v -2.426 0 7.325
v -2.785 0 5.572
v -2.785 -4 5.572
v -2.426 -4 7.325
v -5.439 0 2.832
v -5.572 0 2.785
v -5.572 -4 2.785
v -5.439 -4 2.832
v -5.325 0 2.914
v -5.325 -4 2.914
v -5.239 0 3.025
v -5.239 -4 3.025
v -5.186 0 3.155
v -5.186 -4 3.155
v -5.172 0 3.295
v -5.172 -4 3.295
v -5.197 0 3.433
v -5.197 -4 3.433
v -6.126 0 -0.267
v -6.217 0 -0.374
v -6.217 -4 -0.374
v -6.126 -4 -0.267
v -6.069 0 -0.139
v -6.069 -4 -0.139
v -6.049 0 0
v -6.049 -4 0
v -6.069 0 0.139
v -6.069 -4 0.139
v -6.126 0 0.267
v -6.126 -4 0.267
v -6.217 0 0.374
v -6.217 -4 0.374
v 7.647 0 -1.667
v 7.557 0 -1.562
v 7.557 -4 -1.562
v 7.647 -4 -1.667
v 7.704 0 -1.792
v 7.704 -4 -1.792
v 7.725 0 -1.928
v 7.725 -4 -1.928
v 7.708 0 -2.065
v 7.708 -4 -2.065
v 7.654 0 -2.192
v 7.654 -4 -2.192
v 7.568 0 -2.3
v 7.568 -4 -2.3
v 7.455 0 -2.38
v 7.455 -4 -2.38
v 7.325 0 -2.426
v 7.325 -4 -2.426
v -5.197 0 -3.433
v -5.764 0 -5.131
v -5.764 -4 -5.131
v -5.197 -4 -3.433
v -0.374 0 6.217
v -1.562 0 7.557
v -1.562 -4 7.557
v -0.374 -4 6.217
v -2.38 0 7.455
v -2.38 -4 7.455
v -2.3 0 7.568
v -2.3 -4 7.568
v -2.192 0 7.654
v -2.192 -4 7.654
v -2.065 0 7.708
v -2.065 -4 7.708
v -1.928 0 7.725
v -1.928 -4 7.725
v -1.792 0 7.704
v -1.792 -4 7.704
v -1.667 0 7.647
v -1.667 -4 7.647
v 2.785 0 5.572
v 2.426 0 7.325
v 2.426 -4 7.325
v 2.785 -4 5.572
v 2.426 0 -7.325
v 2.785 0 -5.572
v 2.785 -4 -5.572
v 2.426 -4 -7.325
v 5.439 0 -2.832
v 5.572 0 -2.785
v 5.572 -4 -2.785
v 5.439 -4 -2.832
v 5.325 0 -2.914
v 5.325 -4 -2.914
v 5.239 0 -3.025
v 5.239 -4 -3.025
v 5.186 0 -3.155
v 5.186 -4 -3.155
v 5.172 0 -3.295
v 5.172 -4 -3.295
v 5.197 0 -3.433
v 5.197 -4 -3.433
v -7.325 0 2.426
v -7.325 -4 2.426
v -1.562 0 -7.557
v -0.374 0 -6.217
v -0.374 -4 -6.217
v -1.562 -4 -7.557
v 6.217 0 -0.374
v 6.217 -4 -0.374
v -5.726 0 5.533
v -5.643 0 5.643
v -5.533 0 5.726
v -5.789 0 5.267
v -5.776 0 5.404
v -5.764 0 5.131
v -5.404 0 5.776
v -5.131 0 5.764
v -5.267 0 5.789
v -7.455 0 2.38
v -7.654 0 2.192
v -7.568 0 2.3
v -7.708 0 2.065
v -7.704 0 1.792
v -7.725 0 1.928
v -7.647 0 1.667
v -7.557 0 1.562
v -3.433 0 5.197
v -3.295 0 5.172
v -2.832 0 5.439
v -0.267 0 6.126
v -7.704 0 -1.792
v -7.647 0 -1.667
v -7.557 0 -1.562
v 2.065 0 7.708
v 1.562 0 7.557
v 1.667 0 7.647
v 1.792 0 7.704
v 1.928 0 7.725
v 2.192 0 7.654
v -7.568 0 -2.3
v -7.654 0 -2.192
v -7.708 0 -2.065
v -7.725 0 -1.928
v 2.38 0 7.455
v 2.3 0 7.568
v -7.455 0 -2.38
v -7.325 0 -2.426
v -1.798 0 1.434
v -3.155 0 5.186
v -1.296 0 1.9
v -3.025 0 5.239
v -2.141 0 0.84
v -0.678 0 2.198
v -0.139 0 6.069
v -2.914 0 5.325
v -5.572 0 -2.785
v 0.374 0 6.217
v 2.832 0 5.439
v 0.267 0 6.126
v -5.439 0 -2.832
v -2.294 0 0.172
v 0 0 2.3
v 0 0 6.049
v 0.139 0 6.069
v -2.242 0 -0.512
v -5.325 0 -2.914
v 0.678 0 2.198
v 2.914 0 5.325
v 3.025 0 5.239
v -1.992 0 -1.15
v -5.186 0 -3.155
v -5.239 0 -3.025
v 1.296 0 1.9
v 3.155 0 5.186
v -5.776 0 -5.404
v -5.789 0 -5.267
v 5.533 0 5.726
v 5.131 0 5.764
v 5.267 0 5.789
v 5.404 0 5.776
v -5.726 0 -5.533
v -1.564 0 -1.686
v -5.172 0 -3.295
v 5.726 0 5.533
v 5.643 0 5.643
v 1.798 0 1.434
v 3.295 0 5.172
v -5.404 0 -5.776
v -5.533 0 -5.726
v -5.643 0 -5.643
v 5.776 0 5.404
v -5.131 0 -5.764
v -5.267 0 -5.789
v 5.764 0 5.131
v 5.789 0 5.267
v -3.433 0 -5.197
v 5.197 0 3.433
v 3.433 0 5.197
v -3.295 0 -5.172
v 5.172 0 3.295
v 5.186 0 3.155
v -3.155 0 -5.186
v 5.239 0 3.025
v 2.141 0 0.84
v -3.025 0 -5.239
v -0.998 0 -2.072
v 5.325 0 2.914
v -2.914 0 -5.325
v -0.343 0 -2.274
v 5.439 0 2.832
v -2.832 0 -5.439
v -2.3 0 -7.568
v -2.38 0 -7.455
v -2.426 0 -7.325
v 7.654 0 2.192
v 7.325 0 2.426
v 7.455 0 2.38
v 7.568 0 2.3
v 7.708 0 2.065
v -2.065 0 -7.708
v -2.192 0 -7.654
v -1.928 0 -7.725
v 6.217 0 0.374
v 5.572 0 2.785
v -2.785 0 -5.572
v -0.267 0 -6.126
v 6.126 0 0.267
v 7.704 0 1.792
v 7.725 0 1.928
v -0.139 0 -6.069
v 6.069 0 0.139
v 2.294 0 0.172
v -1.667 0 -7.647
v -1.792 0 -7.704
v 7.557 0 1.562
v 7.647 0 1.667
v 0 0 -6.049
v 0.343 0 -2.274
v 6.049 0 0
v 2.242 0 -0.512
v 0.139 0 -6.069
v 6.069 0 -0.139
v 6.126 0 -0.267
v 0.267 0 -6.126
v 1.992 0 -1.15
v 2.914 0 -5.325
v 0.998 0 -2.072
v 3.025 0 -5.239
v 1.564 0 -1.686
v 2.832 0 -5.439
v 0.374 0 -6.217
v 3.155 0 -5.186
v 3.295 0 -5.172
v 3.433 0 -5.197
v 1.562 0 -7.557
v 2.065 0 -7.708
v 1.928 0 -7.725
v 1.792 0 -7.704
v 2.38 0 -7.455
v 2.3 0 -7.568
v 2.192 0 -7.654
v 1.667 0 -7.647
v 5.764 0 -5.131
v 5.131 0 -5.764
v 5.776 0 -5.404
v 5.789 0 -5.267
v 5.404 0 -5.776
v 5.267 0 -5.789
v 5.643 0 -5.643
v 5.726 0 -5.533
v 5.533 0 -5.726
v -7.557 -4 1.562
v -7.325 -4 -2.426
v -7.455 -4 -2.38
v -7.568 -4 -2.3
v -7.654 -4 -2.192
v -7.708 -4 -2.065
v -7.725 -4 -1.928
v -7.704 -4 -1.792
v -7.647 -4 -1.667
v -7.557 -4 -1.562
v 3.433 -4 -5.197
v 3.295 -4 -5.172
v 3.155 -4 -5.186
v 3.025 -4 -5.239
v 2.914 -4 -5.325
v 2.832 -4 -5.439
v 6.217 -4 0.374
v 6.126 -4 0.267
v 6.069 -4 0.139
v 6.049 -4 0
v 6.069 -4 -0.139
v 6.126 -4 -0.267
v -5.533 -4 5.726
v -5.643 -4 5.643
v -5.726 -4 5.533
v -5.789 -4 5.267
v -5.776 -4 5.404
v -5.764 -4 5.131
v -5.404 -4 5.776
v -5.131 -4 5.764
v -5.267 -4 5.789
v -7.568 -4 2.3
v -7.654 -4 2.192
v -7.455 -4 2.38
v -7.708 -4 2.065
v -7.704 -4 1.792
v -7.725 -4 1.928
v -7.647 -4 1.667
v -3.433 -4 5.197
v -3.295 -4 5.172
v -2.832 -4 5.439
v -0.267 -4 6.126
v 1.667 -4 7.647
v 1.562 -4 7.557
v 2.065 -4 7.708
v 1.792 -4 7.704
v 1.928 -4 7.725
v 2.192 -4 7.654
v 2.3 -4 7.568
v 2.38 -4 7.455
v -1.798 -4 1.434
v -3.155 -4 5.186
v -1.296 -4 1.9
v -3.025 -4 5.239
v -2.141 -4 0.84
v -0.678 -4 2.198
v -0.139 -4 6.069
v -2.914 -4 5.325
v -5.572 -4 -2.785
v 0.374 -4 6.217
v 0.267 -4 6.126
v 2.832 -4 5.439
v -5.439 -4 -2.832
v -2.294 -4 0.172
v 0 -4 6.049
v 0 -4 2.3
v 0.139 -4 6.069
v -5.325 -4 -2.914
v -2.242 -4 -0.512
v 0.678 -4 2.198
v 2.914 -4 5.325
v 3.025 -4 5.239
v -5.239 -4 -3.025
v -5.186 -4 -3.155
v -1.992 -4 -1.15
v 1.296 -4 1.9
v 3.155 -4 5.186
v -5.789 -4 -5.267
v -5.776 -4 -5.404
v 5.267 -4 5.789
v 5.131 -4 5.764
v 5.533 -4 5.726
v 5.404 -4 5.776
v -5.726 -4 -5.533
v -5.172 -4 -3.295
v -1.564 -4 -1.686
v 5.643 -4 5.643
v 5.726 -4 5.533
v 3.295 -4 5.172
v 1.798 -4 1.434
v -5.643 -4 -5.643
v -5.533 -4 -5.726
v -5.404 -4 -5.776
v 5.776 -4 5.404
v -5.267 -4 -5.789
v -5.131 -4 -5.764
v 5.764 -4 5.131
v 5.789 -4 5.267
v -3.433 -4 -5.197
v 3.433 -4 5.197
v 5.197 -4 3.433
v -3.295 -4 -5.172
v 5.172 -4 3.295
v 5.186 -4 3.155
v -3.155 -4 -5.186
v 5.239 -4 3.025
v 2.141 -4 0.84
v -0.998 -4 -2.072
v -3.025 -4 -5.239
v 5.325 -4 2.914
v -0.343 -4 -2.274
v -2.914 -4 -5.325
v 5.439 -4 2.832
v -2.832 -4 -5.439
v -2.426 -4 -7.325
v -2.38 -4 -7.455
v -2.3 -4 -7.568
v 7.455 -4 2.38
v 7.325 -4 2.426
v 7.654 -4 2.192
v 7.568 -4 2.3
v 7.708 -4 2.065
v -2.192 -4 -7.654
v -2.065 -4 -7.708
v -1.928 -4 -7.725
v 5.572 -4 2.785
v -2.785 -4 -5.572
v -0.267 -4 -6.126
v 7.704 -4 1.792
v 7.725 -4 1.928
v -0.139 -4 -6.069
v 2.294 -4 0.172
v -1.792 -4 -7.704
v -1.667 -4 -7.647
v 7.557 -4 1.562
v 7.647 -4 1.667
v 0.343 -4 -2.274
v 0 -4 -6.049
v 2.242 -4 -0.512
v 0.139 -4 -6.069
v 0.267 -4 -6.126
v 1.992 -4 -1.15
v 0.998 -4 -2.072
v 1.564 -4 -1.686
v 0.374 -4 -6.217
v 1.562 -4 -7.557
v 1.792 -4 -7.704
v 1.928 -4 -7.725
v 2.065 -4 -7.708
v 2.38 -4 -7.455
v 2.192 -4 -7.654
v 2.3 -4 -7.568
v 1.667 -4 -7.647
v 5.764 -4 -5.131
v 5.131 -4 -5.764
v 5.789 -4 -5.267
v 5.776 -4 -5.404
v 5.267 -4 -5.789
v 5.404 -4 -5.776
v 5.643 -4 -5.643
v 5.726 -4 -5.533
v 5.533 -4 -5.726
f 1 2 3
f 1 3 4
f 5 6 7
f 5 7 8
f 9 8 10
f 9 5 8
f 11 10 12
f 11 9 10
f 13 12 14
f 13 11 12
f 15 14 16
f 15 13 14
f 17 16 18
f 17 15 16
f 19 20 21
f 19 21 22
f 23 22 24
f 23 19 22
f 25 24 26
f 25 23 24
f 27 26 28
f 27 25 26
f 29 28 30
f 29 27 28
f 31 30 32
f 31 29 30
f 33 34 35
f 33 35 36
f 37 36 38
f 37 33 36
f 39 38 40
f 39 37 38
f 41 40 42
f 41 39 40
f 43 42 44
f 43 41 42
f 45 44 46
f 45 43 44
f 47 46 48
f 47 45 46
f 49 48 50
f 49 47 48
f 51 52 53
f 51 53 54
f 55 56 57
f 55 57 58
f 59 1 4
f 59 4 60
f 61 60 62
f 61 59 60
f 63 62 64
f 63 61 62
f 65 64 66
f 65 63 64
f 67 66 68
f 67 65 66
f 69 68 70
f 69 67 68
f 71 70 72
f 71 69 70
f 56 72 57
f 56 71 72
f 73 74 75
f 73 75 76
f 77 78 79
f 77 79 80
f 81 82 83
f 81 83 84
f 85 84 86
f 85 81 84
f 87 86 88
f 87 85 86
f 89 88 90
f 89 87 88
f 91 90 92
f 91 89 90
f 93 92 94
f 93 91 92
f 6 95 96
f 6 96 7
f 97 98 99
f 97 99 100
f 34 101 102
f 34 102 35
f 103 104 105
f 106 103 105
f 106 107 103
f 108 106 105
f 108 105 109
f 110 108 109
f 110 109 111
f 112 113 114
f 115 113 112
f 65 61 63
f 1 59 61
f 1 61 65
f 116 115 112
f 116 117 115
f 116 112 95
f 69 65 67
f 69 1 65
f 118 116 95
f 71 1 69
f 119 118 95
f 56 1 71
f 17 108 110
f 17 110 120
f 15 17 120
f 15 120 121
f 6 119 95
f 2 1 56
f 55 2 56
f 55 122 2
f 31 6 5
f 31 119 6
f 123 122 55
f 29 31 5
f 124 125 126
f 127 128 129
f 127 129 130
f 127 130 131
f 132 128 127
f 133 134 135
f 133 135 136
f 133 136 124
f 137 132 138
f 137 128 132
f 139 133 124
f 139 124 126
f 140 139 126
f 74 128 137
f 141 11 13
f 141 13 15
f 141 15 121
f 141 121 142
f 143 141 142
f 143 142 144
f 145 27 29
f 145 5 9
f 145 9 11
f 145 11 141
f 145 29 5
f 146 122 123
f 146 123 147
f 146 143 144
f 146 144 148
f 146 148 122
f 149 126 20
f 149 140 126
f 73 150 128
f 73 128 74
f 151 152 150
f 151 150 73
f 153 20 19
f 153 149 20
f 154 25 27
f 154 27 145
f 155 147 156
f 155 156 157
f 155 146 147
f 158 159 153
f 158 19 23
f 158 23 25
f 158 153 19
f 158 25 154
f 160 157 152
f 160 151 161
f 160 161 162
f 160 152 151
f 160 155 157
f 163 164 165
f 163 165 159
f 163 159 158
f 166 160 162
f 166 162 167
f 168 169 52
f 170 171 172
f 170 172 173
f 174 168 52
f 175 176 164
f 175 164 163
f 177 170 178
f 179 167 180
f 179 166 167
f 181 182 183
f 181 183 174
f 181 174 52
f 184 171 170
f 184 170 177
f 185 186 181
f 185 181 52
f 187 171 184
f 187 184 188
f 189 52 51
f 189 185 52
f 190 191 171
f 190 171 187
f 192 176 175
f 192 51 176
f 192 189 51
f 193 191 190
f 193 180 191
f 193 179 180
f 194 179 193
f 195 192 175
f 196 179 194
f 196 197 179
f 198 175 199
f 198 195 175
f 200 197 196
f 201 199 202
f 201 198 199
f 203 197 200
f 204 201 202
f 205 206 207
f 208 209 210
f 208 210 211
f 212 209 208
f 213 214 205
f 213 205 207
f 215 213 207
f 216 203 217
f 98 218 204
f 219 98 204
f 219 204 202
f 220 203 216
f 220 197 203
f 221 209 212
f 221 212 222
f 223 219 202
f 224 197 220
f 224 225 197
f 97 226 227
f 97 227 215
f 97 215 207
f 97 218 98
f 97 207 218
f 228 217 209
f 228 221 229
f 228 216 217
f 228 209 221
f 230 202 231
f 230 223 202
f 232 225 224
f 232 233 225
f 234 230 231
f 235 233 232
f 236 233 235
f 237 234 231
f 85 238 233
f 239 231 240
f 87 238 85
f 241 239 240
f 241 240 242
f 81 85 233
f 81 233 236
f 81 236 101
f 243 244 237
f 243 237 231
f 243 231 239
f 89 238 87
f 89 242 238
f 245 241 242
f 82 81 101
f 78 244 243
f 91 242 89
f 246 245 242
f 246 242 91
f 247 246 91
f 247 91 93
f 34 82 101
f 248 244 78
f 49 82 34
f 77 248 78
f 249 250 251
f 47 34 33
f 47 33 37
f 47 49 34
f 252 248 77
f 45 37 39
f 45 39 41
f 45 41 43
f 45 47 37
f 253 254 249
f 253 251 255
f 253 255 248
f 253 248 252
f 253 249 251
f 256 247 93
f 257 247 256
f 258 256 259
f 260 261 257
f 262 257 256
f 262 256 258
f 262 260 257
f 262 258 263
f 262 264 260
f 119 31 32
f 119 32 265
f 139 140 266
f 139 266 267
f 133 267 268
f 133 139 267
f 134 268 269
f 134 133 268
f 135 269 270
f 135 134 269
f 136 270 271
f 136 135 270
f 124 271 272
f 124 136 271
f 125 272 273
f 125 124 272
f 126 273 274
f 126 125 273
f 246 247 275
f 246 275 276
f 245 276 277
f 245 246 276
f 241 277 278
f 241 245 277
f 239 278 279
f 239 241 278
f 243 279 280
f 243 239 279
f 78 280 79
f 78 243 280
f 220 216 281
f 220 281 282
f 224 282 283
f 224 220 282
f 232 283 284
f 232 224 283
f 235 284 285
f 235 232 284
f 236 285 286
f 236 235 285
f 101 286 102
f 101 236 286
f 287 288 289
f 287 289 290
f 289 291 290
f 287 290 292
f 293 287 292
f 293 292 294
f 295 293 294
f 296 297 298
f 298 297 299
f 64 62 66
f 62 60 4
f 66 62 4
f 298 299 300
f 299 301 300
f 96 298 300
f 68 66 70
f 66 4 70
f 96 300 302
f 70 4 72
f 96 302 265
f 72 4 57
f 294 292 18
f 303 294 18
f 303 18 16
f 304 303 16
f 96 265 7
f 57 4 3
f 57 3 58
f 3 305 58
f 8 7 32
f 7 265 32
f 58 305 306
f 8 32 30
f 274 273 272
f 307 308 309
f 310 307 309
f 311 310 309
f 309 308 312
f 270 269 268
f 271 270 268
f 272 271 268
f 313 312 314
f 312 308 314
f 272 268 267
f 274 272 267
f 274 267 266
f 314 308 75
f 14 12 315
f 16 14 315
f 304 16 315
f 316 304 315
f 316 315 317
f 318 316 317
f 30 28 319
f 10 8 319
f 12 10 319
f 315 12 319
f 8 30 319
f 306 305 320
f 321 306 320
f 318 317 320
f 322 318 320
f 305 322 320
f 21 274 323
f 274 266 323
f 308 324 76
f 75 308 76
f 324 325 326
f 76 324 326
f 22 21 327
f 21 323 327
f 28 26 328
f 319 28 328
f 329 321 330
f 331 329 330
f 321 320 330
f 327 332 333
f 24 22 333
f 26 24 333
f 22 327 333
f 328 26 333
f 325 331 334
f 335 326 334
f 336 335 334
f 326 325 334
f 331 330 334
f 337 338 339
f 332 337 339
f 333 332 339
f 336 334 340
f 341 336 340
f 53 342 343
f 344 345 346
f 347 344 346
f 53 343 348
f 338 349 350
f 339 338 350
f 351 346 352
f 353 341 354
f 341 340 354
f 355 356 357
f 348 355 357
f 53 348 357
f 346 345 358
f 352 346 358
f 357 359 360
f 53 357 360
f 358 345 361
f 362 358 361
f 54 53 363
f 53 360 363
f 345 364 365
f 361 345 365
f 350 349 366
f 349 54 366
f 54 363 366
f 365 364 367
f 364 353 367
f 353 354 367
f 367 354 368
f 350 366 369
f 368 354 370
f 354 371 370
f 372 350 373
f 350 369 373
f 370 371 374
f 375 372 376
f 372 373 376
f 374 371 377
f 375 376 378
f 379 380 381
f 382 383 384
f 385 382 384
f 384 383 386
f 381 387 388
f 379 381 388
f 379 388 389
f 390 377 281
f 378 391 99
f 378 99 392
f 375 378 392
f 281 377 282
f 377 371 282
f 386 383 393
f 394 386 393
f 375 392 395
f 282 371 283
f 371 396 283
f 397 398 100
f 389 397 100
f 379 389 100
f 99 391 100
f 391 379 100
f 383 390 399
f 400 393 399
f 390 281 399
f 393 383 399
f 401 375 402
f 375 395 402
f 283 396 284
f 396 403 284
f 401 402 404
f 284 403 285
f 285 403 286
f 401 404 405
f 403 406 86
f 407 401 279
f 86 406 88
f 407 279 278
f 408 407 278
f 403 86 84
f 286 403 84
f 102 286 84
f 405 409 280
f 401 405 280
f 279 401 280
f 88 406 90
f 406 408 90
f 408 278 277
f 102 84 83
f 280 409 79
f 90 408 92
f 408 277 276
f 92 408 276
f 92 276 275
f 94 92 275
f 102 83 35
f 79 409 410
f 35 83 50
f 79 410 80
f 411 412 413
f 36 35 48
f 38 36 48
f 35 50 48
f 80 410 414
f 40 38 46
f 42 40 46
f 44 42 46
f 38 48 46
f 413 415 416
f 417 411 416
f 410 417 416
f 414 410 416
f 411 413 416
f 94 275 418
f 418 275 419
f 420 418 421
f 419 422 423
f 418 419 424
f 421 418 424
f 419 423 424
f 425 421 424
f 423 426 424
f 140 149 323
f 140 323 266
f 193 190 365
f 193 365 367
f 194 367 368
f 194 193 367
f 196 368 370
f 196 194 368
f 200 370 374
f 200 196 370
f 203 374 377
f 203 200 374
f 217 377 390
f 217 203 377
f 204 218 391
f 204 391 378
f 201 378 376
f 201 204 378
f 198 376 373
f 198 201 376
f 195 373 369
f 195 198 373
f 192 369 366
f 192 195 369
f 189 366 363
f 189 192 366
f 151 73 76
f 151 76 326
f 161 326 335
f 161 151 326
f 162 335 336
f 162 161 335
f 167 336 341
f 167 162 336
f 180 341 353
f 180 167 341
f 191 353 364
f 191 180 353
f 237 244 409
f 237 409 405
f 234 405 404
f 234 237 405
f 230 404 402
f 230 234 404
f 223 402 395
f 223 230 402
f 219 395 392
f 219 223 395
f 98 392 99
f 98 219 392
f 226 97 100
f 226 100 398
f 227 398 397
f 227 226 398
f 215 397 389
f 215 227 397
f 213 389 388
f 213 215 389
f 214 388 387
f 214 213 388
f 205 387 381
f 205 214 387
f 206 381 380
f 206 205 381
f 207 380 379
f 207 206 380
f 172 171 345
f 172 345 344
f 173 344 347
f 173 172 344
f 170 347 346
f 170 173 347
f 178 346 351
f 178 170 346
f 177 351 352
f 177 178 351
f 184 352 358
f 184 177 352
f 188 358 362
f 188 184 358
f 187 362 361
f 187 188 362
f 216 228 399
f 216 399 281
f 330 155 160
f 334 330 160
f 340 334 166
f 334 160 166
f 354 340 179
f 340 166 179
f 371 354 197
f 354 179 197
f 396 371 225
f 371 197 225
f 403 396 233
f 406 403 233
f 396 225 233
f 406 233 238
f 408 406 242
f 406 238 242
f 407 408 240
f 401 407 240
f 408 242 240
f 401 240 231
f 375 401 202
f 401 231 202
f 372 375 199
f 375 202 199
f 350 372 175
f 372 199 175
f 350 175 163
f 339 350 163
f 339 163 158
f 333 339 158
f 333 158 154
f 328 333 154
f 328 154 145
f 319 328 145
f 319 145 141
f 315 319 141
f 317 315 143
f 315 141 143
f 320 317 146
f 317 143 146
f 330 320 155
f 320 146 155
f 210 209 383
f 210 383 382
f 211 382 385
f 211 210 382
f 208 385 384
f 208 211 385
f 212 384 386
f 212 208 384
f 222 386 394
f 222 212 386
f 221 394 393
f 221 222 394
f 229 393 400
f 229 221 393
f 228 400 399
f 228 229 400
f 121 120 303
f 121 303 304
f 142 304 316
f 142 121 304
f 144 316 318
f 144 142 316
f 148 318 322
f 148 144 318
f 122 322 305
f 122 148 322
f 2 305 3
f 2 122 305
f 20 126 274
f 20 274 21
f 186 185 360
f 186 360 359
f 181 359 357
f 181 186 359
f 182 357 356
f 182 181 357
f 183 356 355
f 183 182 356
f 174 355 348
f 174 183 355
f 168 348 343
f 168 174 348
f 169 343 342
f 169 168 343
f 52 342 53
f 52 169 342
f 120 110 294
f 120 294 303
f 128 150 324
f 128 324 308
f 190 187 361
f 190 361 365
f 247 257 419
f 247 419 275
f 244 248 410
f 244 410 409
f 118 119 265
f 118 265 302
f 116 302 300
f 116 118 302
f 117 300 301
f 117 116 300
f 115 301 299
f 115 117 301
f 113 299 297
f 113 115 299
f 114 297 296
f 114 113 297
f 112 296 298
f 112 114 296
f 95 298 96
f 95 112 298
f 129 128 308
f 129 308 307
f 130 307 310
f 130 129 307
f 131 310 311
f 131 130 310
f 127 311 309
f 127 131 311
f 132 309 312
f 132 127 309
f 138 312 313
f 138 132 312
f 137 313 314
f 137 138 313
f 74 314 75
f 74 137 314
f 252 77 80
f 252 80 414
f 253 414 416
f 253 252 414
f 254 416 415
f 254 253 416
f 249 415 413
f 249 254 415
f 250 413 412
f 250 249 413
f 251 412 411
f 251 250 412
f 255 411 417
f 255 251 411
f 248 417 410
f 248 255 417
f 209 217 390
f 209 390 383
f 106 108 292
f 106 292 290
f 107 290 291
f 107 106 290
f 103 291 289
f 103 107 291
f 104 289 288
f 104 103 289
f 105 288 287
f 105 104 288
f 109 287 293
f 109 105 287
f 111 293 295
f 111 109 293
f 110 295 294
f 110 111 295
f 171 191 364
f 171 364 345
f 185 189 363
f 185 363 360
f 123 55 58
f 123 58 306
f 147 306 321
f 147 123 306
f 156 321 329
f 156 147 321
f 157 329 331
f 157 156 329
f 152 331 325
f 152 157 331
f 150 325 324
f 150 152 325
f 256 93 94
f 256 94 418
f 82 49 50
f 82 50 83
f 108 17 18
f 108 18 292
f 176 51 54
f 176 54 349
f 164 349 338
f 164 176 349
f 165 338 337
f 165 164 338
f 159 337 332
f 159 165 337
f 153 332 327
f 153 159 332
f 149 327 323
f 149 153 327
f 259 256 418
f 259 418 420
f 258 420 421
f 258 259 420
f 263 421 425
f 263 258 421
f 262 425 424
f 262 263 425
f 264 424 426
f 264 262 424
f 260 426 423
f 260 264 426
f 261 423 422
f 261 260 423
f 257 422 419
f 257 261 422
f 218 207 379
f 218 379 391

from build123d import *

# Parameters (mm, degrees)
SKETCH2_R           = 2.3
BOSS_EXTRUDE1_DEPTH = 4


with BuildPart() as part:
    # Sketch2 → Boss-Extrude1 (new body)
    with BuildSketch(Plane(origin=(0, 0, 0), x_dir=(1, 0, 0), z_dir=(0, 1, 0))):
        with BuildLine():
            Line((-2.784735434, -5.571506186), (-2.425826245, -7.32540615))
            ThreePointArc((-2.425826245, -7.32540615), (-2.065386908, -7.708128878), (-1.561875921, -7.556900941))
            Line((-1.561875921, -7.556900941), (-0.374101464, -6.217433611))
            ThreePointArc((-0.374101464, -6.217433611), (0, -6.049168588), (0.374101464, -6.217433611))
            Line((0.374101464, -6.217433611), (1.561875921, -7.556900941))
            ThreePointArc((1.561875921, -7.556900941), (2.065386908, -7.708128878), (2.425826245, -7.32540615))
            Line((2.425826245, -7.32540615), (2.784735434, -5.571506186))
            ThreePointArc((2.784735434, -5.571506186), (3.024584294, -5.238733669), (3.432698177, -5.197404722))
            Line((3.432698177, -5.197404722), (5.131074696, -5.763530228))
            ThreePointArc((5.131074696, -5.763530228), (5.64274197, -5.64274197), (5.763530228, -5.131074696))
            Line((5.763530228, -5.131074696), (5.197404722, -3.432698177))
            ThreePointArc((5.197404722, -3.432698177), (5.238733669, -3.024584294), (5.571506186, -2.784735434))
            Line((5.571506186, -2.784735434), (7.32540615, -2.425826245))
            ThreePointArc((7.32540615, -2.425826245), (7.708128878, -2.065386908), (7.556900941, -1.561875921))
            Line((7.556900941, -1.561875921), (6.217433611, -0.374101464))
            ThreePointArc((6.217433611, -0.374101464), (6.049168588, 0), (6.217433611, 0.374101464))
            Line((6.217433611, 0.374101464), (7.556900941, 1.561875921))
            ThreePointArc((7.556900941, 1.561875921), (7.708128878, 2.065386908), (7.32540615, 2.425826245))
            Line((7.32540615, 2.425826245), (5.571506186, 2.784735434))
            ThreePointArc((5.571506186, 2.784735434), (5.238733669, 3.024584294), (5.197404722, 3.432698177))
            Line((5.197404722, 3.432698177), (5.763530228, 5.131074696))
            ThreePointArc((5.763530228, 5.131074696), (5.64274197, 5.64274197), (5.131074696, 5.763530228))
            Line((5.131074696, 5.763530228), (3.432698177, 5.197404722))
            ThreePointArc((3.432698177, 5.197404722), (3.024584294, 5.238733669), (2.784735434, 5.571506186))
            Line((2.784735434, 5.571506186), (2.425826245, 7.32540615))
            ThreePointArc((2.425826245, 7.32540615), (2.065386908, 7.708128878), (1.561875921, 7.556900941))
            Line((1.561875921, 7.556900941), (0.374101464, 6.217433611))
            ThreePointArc((0.374101464, 6.217433611), (0, 6.049168588), (-0.374101464, 6.217433611))
            Line((-0.374101464, 6.217433611), (-1.561875921, 7.556900941))
            ThreePointArc((-1.561875921, 7.556900941), (-2.065386908, 7.708128878), (-2.425826245, 7.32540615))
            Line((-2.425826245, 7.32540615), (-2.784735434, 5.571506186))
            ThreePointArc((-2.784735434, 5.571506186), (-3.024584294, 5.238733669), (-3.432698177, 5.197404722))
            Line((-3.432698177, 5.197404722), (-5.131074696, 5.763530228))
            ThreePointArc((-5.131074696, 5.763530228), (-5.64274197, 5.64274197), (-5.763530228, 5.131074696))
            Line((-5.763530228, 5.131074696), (-5.197404722, 3.432698177))
            ThreePointArc((-5.197404722, 3.432698177), (-5.238733669, 3.024584294), (-5.571506186, 2.784735434))
            Line((-5.571506186, 2.784735434), (-7.32540615, 2.425826245))
            ThreePointArc((-7.32540615, 2.425826245), (-7.708128878, 2.065386908), (-7.556900941, 1.561875921))
            Line((-7.556900941, 1.561875921), (-6.217433611, 0.374101464))
            ThreePointArc((-6.217433611, 0.374101464), (-6.049168588, 0), (-6.217433611, -0.374101464))
            Line((-6.217433611, -0.374101464), (-7.556900941, -1.561875921))
            ThreePointArc((-7.556900941, -1.561875921), (-7.708128878, -2.065386908), (-7.32540615, -2.425826245))
            Line((-7.32540615, -2.425826245), (-5.571506186, -2.784735434))
            ThreePointArc((-5.571506186, -2.784735434), (-5.238733669, -3.024584294), (-5.197404722, -3.432698177))
            Line((-5.197404722, -3.432698177), (-5.763530228, -5.131074696))
            ThreePointArc((-5.763530228, -5.131074696), (-5.64274197, -5.64274197), (-5.131074696, -5.763530228))
            Line((-5.131074696, -5.763530228), (-3.432698177, -5.197404722))
            ThreePointArc((-3.432698177, -5.197404722), (-3.024584294, -5.238733669), (-2.784735434, -5.571506186))
        make_face()
        with Locations(Location((0, 0, 0), (0, 0, 270))):
            Circle(SKETCH2_R, mode=Mode.SUBTRACT)
    extrude(amount=-BOSS_EXTRUDE1_DEPTH)


solid = part.part
